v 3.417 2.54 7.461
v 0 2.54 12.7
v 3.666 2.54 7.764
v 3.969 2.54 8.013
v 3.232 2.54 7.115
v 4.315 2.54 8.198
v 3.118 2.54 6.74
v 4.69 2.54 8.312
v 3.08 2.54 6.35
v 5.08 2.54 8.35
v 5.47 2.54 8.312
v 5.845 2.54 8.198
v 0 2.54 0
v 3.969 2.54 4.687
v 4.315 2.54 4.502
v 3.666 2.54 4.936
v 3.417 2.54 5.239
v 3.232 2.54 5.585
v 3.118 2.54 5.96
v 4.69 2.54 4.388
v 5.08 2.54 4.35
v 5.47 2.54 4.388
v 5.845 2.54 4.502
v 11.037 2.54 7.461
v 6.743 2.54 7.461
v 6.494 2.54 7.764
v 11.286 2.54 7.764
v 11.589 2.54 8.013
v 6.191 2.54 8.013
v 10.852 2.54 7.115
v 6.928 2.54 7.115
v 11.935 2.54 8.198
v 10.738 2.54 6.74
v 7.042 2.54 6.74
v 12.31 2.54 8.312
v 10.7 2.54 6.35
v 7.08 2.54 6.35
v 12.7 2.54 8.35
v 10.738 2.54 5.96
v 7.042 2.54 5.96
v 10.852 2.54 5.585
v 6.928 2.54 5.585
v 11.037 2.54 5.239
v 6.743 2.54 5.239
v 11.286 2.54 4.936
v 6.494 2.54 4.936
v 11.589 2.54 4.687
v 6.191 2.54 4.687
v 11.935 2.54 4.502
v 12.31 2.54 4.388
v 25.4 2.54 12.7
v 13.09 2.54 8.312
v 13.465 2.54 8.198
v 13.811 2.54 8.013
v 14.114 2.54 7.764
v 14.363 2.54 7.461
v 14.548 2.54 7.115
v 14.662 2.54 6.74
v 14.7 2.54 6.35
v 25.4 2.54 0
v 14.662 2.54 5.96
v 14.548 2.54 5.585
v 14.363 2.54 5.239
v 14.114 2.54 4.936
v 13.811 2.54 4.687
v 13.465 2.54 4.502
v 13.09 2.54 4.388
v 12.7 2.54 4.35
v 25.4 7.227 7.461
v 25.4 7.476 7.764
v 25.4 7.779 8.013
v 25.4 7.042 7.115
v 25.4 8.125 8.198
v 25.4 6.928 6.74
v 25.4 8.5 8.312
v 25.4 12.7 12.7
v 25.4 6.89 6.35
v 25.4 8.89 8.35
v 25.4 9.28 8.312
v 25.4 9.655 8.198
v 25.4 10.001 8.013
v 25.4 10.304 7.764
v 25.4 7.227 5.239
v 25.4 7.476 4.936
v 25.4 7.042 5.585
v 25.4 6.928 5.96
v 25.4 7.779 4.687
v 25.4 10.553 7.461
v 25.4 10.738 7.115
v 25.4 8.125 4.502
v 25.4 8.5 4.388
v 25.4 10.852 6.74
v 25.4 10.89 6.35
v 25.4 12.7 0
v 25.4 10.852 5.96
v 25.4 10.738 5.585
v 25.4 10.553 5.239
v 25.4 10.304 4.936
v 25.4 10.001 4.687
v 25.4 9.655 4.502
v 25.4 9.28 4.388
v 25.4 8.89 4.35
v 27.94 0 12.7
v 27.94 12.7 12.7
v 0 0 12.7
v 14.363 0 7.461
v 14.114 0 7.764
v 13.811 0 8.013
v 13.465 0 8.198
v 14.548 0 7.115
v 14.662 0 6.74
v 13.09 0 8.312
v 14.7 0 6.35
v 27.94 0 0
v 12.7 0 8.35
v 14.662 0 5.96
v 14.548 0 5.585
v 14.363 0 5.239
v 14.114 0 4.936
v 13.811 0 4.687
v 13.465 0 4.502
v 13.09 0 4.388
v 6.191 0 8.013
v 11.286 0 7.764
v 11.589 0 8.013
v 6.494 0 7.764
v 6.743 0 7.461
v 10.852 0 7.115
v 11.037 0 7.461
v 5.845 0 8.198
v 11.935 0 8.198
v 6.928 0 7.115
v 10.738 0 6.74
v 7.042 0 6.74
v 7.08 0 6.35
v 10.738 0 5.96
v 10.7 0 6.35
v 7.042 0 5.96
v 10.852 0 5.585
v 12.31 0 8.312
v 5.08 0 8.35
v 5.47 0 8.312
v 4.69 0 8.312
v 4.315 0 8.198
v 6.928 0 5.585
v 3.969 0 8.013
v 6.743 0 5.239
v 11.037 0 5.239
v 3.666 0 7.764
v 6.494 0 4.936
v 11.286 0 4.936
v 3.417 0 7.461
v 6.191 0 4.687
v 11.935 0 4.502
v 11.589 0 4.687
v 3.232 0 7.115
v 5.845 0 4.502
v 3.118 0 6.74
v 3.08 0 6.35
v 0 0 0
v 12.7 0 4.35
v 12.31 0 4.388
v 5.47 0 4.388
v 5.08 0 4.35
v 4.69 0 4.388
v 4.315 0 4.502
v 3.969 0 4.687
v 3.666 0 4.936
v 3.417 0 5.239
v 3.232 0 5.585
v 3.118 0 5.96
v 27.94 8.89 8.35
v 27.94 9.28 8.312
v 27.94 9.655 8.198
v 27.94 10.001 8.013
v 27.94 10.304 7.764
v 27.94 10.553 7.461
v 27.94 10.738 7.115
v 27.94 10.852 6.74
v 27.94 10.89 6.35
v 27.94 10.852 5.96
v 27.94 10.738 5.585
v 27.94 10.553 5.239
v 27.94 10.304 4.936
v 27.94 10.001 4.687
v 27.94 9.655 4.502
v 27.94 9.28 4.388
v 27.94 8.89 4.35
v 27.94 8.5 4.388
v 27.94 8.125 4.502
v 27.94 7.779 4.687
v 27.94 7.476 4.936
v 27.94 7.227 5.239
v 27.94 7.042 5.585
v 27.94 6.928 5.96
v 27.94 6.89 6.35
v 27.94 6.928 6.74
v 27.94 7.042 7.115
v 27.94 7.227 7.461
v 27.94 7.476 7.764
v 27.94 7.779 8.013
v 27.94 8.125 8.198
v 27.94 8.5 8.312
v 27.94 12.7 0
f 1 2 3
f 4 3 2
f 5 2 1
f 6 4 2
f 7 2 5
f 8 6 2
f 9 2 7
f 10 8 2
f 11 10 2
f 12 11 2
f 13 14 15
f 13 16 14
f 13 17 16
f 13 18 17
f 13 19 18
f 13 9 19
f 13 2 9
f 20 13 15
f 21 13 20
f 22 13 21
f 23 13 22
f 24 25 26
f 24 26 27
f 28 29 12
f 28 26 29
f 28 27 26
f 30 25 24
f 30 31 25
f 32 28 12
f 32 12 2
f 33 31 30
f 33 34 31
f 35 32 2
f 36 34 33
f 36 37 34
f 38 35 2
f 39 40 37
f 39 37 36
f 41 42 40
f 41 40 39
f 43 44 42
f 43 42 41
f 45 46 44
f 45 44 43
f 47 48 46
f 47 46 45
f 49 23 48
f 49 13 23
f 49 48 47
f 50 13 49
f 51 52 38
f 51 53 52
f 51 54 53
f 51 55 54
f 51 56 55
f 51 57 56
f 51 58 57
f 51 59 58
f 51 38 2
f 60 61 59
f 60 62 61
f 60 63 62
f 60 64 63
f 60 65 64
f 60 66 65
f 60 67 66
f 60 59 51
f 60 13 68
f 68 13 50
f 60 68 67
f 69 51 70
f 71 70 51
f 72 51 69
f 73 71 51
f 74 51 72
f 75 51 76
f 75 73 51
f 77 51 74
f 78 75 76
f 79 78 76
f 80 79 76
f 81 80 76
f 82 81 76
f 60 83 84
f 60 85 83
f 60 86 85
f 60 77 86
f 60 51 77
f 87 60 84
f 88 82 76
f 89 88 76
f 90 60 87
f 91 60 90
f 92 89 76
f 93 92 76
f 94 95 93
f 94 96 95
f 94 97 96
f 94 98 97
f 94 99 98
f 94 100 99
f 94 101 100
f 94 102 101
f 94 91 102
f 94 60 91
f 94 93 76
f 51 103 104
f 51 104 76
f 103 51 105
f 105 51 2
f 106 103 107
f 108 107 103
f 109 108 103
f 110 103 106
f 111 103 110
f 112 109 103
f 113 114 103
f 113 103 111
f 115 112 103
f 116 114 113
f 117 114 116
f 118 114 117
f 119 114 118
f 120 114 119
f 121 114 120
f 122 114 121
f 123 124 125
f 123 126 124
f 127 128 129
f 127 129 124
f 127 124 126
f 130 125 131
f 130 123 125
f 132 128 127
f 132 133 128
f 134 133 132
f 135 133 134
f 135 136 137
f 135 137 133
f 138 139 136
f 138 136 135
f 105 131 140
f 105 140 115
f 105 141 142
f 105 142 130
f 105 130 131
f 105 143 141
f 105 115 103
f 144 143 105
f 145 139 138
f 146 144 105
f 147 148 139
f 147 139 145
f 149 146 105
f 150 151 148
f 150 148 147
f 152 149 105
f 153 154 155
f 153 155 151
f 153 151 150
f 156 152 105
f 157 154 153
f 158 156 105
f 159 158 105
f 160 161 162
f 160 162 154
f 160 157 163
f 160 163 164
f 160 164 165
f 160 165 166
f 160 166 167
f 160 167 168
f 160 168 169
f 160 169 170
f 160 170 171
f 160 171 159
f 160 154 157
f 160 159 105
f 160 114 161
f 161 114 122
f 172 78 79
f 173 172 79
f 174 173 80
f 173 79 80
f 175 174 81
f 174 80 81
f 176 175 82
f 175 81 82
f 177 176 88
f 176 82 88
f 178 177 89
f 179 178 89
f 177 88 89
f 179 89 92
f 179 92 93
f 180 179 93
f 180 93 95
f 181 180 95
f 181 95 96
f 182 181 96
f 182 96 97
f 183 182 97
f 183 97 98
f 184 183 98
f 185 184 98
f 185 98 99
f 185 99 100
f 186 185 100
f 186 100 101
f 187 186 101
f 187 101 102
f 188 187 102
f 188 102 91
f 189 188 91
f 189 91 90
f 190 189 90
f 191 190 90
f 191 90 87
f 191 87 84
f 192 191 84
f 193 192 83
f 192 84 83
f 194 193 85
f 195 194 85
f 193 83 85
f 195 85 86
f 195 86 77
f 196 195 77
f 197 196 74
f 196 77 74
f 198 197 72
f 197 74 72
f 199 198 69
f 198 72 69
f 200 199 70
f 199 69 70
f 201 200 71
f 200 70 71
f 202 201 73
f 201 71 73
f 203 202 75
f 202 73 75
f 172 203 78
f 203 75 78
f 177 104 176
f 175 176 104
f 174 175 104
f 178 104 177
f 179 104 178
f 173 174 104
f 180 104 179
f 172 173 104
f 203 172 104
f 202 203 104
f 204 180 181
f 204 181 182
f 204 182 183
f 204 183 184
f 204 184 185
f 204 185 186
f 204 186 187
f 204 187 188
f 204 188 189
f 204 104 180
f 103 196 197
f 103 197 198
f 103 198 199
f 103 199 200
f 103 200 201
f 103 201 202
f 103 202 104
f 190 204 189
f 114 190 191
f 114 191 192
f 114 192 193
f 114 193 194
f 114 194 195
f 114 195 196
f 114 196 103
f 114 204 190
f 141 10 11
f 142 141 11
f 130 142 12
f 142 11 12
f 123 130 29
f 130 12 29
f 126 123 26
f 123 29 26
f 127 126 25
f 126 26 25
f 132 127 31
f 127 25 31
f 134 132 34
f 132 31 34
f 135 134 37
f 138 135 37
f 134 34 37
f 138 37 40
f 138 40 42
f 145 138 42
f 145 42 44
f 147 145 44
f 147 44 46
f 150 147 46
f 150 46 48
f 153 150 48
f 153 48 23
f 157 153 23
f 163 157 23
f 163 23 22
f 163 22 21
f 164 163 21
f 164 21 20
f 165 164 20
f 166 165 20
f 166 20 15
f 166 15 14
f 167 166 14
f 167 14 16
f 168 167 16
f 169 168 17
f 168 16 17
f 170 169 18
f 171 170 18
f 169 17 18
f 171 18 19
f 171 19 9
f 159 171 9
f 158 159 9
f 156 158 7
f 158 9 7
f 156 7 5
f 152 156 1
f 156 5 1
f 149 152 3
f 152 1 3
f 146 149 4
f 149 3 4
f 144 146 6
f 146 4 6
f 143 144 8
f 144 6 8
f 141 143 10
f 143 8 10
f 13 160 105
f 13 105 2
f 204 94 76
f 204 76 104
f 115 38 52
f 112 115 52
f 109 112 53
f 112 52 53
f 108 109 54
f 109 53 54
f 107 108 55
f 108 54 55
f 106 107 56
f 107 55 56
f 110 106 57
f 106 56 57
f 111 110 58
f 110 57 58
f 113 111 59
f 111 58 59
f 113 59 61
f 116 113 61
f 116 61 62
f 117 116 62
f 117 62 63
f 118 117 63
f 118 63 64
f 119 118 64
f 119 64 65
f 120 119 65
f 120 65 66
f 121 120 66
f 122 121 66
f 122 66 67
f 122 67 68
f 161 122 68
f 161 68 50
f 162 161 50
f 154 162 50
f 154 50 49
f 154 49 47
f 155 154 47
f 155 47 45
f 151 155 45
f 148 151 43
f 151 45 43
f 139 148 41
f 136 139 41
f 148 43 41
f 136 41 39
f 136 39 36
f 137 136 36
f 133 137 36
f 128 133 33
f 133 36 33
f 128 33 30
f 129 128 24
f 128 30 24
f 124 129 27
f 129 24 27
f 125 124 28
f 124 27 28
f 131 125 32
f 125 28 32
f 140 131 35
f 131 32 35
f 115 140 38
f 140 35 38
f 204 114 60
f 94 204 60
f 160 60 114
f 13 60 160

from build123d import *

# Parameters (mm, degrees)
BOSS_EXTRUDE1_DEPTH = 12.7
SKETCH3_R           = 2
CUT_EXTRUDE1_DEPTH  = 33.328922036
SKETCH2_R           = 2
CUT_EXTRUDE2_DEPTH  = 32.108519733


with BuildPart() as part:
    # Sketch1 → Boss-Extrude1 (new body)
    with BuildSketch(Plane.XY):
        Polygon((0, 0), (0, 2.54), (25.4, 2.54), (25.4, 12.7), (27.94, 12.7), (27.94, 0), align=None)
    extrude(amount=BOSS_EXTRUDE1_DEPTH)

    # Sketch3 → Cut-Extrude1 (cut, through all)
    with BuildSketch(Plane(origin=(0, 2.54, 0), x_dir=(1, 0, 0), z_dir=(0, 1, 0))):
        with Locations(Location((5.08, -6.35, 0), (0, 0, 270))):
            Circle(SKETCH3_R)
        with Locations(Location((12.7, -6.35, 0), (0, 0, 270))):
            Circle(SKETCH3_R)
    extrude(amount=-CUT_EXTRUDE1_DEPTH, mode=Mode.SUBTRACT)

    # Sketch2 → Cut-Extrude2 (cut, through all)
    with BuildSketch(Plane.ZY.offset(-25.4)):
        with Locations((6.35, 8.89)):
            Circle(SKETCH2_R)
    extrude(amount=-CUT_EXTRUDE2_DEPTH, mode=Mode.SUBTRACT)


solid = part.part
